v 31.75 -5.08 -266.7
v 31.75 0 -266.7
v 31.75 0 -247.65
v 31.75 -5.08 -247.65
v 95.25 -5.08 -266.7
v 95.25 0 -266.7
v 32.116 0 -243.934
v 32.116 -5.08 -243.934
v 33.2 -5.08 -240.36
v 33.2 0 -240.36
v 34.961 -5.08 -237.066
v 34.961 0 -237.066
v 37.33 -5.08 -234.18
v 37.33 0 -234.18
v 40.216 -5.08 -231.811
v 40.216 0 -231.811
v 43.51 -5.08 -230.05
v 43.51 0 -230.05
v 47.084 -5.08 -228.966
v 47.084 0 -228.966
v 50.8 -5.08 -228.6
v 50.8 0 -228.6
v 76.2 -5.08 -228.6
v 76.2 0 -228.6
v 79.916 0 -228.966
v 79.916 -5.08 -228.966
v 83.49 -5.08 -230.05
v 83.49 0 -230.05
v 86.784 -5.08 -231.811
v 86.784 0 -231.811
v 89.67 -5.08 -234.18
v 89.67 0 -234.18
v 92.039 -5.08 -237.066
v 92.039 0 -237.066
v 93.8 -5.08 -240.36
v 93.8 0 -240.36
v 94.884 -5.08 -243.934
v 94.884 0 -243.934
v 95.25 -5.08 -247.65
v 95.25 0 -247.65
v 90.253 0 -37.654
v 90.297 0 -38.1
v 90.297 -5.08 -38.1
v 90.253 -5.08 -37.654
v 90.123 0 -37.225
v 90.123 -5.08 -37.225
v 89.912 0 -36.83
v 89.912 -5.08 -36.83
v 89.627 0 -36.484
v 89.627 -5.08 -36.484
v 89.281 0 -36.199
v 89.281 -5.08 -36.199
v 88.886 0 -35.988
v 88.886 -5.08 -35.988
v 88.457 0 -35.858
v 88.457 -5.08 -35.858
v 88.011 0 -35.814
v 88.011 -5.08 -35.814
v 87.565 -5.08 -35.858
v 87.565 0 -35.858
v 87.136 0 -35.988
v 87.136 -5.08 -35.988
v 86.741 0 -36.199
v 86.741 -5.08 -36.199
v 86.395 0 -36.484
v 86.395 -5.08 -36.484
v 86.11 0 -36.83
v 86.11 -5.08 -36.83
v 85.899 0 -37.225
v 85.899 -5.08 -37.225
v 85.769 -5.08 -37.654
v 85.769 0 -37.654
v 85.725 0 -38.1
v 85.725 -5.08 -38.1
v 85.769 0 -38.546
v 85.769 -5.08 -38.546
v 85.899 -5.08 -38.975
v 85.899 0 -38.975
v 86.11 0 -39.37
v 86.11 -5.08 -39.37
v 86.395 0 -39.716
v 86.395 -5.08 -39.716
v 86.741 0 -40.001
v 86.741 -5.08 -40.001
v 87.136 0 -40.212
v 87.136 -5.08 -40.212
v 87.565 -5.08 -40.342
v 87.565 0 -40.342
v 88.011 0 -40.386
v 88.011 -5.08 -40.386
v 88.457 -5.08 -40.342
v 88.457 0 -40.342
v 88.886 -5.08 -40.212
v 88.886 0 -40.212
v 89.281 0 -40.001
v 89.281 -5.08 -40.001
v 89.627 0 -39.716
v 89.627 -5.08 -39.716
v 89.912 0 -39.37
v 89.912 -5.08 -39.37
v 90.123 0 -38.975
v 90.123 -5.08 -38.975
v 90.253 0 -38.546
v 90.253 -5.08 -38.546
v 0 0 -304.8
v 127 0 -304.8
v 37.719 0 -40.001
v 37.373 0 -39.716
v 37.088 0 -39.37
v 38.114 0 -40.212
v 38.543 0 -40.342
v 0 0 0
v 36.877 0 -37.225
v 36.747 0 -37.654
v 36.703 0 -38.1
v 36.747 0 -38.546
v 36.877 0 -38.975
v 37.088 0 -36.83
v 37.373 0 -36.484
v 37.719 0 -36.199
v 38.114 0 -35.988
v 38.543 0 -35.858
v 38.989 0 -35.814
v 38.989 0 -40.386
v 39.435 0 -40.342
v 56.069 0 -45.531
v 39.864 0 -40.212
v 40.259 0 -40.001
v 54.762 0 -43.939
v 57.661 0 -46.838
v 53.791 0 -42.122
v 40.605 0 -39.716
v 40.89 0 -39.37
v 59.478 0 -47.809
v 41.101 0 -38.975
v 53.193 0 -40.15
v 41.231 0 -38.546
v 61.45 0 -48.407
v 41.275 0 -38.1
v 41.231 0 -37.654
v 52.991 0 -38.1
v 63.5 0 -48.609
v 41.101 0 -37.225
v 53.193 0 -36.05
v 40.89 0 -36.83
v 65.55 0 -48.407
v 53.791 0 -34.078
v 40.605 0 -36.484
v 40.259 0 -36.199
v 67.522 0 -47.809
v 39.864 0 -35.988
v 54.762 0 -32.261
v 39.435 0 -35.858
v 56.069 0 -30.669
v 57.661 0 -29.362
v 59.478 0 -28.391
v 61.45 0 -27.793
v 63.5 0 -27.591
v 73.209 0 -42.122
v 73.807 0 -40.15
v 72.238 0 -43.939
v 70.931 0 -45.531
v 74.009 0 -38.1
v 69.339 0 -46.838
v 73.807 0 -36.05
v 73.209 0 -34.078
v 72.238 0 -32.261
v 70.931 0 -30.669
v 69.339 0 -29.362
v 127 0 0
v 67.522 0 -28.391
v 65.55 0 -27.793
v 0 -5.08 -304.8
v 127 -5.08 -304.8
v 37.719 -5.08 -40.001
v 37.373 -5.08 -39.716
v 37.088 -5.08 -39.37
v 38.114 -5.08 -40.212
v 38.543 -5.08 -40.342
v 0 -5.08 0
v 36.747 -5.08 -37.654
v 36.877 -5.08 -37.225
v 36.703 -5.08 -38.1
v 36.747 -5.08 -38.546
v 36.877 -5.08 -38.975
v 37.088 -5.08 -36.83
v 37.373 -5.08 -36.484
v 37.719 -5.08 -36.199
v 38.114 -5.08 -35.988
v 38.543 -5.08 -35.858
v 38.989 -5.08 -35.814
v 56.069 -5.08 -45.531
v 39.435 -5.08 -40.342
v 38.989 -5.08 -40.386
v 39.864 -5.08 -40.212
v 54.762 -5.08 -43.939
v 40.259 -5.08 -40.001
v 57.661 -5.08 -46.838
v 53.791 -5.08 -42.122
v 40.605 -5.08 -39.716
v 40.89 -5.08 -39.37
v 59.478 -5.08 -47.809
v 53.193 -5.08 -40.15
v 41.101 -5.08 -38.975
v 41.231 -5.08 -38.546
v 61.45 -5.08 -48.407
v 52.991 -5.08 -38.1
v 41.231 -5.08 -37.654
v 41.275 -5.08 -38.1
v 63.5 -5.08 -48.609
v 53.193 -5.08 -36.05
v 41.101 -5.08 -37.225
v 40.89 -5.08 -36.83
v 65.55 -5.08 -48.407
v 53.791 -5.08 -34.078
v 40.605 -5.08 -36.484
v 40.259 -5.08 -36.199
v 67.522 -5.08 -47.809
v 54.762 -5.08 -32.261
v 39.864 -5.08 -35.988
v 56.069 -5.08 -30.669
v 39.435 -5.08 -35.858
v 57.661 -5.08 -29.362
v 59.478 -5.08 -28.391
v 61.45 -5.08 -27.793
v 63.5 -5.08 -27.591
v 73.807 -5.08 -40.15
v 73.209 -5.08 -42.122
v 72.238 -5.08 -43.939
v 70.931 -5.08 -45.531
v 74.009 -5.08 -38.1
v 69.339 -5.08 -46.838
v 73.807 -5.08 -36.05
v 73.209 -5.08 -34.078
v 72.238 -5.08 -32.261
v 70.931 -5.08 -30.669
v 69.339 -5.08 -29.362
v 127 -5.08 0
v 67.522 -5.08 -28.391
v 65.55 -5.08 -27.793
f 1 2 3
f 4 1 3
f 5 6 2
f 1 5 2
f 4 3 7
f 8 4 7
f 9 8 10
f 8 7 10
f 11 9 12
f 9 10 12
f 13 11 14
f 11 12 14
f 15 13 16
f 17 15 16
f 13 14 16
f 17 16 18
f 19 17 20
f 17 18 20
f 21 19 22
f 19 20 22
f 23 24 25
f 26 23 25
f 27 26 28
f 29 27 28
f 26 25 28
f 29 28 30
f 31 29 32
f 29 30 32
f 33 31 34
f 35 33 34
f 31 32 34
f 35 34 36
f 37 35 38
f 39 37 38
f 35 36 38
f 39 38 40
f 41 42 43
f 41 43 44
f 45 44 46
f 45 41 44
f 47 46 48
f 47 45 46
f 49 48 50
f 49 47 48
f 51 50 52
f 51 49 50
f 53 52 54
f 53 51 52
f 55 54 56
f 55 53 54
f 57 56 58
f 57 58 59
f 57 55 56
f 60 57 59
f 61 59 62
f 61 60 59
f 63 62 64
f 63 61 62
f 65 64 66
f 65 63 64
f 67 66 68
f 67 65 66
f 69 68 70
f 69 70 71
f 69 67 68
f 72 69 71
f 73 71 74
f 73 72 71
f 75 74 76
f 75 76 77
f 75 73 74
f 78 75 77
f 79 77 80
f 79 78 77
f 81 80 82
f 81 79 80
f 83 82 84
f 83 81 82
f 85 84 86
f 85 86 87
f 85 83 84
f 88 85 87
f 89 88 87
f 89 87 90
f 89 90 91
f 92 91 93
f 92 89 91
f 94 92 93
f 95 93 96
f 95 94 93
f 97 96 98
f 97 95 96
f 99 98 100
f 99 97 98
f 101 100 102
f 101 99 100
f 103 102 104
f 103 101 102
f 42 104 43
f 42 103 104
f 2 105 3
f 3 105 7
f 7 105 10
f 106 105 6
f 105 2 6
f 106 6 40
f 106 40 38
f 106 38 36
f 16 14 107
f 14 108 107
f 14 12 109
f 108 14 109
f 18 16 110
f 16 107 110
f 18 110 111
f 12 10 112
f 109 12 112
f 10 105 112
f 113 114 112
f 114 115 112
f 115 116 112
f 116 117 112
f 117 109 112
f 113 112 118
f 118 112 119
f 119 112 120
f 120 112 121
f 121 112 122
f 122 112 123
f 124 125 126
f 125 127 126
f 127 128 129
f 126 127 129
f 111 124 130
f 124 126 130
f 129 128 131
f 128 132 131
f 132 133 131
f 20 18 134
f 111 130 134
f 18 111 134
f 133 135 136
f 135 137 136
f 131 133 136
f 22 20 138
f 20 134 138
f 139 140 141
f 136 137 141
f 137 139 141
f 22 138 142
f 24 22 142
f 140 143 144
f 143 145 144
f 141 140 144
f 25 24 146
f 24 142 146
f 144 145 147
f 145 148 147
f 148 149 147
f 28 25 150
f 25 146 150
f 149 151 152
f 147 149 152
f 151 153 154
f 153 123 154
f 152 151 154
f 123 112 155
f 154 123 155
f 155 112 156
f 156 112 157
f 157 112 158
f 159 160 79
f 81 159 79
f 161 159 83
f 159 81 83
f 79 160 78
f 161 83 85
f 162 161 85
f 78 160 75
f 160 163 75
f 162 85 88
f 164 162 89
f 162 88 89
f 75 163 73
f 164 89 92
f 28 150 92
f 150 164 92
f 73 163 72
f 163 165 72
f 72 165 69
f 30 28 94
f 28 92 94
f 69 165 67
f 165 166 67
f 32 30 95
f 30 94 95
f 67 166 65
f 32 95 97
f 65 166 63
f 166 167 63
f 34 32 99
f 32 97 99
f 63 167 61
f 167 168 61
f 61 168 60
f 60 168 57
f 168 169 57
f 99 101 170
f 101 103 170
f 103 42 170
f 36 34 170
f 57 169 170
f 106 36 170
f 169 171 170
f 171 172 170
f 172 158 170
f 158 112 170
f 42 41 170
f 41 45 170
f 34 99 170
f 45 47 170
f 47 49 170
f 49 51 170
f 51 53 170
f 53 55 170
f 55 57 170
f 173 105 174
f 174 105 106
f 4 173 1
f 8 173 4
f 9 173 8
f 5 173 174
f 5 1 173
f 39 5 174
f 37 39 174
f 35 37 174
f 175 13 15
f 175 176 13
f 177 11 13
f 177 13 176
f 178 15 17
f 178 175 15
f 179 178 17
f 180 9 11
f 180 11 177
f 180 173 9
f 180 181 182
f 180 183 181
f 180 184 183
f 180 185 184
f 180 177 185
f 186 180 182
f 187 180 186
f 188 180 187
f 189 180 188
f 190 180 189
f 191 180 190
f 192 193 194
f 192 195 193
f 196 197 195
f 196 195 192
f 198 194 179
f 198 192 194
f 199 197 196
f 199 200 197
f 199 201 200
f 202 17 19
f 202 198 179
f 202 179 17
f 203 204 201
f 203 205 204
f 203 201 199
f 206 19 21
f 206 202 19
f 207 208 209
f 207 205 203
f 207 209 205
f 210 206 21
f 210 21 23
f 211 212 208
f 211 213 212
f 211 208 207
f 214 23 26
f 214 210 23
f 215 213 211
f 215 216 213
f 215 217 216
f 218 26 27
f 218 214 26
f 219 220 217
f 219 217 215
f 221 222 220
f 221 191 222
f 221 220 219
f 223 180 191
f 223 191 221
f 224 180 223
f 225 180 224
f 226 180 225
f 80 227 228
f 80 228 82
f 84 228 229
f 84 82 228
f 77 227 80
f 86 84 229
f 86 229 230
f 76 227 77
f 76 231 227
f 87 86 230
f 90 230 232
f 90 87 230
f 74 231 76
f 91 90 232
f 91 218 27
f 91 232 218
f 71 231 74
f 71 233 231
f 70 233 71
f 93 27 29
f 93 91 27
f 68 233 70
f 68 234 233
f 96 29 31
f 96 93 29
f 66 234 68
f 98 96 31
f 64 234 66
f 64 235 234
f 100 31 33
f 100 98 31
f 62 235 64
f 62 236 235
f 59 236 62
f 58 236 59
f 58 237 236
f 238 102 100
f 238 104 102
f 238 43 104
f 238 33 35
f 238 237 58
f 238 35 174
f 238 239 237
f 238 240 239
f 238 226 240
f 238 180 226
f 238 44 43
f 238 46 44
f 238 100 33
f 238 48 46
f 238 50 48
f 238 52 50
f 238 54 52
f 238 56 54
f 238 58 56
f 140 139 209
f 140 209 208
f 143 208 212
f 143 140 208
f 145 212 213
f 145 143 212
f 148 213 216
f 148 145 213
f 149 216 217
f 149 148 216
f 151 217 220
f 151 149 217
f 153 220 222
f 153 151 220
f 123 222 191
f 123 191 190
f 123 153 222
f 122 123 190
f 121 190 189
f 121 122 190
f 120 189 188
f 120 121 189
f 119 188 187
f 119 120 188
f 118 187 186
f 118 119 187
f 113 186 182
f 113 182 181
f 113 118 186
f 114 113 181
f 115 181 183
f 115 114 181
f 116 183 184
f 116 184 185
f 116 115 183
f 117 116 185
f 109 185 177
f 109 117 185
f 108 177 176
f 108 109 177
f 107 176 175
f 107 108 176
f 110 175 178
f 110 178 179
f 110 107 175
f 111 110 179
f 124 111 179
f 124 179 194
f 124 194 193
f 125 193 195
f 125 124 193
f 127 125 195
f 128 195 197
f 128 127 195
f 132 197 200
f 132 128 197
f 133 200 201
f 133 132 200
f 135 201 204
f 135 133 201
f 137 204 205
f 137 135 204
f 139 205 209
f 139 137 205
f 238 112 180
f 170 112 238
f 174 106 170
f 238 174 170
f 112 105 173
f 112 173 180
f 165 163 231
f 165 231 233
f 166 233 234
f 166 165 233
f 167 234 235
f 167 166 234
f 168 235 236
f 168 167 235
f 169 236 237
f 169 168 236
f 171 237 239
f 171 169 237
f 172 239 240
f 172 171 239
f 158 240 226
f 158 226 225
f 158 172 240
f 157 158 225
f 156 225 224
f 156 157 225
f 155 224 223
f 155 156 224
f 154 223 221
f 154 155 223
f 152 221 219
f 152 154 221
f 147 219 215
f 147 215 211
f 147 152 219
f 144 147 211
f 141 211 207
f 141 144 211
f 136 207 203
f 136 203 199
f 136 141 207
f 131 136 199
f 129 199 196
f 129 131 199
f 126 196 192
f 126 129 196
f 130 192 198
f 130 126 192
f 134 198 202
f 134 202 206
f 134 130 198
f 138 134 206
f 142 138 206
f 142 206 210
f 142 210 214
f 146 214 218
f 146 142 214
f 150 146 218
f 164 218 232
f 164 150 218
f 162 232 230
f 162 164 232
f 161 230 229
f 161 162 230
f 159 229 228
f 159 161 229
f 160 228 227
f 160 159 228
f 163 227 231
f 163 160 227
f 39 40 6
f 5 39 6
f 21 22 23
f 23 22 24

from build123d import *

# Parameters (mm, degrees)
F0_W     = 127
F0_H     = 304.8
F0_R     = 2.286
F0_R_2   = 10.50925
F1_DEPTH = 5.08


with BuildPart() as f1:
    # F0 (on Front) → F1 (new body)
    with BuildSketch(Plane.XZ):
        with Locations((63.5, -152.4)):
            Rectangle(F0_W, F0_H)
        with BuildLine():
            Line((95.25, -266.7), (31.75, -266.7))
            Line((31.75, -266.7), (31.75, -247.65))
            ThreePointArc((31.75, -247.65), (37.329616, -234.179616), (50.8, -228.6))
            Line((50.8, -228.6), (76.2, -228.6))
            ThreePointArc((76.2, -228.6), (89.670384, -234.179616), (95.25, -247.65))
            Line((95.25, -247.65), (95.25, -266.7))
        make_face(mode=Mode.SUBTRACT)
        with Locations((38.989, -38.1)):
            Circle(F0_R, mode=Mode.SUBTRACT)
        with Locations((63.5, -38.1)):
            Circle(F0_R_2, mode=Mode.SUBTRACT)
        with Locations((88.011, -38.1)):
            Circle(F0_R, mode=Mode.SUBTRACT)
    extrude(amount=F1_DEPTH)


solid = f1.part
